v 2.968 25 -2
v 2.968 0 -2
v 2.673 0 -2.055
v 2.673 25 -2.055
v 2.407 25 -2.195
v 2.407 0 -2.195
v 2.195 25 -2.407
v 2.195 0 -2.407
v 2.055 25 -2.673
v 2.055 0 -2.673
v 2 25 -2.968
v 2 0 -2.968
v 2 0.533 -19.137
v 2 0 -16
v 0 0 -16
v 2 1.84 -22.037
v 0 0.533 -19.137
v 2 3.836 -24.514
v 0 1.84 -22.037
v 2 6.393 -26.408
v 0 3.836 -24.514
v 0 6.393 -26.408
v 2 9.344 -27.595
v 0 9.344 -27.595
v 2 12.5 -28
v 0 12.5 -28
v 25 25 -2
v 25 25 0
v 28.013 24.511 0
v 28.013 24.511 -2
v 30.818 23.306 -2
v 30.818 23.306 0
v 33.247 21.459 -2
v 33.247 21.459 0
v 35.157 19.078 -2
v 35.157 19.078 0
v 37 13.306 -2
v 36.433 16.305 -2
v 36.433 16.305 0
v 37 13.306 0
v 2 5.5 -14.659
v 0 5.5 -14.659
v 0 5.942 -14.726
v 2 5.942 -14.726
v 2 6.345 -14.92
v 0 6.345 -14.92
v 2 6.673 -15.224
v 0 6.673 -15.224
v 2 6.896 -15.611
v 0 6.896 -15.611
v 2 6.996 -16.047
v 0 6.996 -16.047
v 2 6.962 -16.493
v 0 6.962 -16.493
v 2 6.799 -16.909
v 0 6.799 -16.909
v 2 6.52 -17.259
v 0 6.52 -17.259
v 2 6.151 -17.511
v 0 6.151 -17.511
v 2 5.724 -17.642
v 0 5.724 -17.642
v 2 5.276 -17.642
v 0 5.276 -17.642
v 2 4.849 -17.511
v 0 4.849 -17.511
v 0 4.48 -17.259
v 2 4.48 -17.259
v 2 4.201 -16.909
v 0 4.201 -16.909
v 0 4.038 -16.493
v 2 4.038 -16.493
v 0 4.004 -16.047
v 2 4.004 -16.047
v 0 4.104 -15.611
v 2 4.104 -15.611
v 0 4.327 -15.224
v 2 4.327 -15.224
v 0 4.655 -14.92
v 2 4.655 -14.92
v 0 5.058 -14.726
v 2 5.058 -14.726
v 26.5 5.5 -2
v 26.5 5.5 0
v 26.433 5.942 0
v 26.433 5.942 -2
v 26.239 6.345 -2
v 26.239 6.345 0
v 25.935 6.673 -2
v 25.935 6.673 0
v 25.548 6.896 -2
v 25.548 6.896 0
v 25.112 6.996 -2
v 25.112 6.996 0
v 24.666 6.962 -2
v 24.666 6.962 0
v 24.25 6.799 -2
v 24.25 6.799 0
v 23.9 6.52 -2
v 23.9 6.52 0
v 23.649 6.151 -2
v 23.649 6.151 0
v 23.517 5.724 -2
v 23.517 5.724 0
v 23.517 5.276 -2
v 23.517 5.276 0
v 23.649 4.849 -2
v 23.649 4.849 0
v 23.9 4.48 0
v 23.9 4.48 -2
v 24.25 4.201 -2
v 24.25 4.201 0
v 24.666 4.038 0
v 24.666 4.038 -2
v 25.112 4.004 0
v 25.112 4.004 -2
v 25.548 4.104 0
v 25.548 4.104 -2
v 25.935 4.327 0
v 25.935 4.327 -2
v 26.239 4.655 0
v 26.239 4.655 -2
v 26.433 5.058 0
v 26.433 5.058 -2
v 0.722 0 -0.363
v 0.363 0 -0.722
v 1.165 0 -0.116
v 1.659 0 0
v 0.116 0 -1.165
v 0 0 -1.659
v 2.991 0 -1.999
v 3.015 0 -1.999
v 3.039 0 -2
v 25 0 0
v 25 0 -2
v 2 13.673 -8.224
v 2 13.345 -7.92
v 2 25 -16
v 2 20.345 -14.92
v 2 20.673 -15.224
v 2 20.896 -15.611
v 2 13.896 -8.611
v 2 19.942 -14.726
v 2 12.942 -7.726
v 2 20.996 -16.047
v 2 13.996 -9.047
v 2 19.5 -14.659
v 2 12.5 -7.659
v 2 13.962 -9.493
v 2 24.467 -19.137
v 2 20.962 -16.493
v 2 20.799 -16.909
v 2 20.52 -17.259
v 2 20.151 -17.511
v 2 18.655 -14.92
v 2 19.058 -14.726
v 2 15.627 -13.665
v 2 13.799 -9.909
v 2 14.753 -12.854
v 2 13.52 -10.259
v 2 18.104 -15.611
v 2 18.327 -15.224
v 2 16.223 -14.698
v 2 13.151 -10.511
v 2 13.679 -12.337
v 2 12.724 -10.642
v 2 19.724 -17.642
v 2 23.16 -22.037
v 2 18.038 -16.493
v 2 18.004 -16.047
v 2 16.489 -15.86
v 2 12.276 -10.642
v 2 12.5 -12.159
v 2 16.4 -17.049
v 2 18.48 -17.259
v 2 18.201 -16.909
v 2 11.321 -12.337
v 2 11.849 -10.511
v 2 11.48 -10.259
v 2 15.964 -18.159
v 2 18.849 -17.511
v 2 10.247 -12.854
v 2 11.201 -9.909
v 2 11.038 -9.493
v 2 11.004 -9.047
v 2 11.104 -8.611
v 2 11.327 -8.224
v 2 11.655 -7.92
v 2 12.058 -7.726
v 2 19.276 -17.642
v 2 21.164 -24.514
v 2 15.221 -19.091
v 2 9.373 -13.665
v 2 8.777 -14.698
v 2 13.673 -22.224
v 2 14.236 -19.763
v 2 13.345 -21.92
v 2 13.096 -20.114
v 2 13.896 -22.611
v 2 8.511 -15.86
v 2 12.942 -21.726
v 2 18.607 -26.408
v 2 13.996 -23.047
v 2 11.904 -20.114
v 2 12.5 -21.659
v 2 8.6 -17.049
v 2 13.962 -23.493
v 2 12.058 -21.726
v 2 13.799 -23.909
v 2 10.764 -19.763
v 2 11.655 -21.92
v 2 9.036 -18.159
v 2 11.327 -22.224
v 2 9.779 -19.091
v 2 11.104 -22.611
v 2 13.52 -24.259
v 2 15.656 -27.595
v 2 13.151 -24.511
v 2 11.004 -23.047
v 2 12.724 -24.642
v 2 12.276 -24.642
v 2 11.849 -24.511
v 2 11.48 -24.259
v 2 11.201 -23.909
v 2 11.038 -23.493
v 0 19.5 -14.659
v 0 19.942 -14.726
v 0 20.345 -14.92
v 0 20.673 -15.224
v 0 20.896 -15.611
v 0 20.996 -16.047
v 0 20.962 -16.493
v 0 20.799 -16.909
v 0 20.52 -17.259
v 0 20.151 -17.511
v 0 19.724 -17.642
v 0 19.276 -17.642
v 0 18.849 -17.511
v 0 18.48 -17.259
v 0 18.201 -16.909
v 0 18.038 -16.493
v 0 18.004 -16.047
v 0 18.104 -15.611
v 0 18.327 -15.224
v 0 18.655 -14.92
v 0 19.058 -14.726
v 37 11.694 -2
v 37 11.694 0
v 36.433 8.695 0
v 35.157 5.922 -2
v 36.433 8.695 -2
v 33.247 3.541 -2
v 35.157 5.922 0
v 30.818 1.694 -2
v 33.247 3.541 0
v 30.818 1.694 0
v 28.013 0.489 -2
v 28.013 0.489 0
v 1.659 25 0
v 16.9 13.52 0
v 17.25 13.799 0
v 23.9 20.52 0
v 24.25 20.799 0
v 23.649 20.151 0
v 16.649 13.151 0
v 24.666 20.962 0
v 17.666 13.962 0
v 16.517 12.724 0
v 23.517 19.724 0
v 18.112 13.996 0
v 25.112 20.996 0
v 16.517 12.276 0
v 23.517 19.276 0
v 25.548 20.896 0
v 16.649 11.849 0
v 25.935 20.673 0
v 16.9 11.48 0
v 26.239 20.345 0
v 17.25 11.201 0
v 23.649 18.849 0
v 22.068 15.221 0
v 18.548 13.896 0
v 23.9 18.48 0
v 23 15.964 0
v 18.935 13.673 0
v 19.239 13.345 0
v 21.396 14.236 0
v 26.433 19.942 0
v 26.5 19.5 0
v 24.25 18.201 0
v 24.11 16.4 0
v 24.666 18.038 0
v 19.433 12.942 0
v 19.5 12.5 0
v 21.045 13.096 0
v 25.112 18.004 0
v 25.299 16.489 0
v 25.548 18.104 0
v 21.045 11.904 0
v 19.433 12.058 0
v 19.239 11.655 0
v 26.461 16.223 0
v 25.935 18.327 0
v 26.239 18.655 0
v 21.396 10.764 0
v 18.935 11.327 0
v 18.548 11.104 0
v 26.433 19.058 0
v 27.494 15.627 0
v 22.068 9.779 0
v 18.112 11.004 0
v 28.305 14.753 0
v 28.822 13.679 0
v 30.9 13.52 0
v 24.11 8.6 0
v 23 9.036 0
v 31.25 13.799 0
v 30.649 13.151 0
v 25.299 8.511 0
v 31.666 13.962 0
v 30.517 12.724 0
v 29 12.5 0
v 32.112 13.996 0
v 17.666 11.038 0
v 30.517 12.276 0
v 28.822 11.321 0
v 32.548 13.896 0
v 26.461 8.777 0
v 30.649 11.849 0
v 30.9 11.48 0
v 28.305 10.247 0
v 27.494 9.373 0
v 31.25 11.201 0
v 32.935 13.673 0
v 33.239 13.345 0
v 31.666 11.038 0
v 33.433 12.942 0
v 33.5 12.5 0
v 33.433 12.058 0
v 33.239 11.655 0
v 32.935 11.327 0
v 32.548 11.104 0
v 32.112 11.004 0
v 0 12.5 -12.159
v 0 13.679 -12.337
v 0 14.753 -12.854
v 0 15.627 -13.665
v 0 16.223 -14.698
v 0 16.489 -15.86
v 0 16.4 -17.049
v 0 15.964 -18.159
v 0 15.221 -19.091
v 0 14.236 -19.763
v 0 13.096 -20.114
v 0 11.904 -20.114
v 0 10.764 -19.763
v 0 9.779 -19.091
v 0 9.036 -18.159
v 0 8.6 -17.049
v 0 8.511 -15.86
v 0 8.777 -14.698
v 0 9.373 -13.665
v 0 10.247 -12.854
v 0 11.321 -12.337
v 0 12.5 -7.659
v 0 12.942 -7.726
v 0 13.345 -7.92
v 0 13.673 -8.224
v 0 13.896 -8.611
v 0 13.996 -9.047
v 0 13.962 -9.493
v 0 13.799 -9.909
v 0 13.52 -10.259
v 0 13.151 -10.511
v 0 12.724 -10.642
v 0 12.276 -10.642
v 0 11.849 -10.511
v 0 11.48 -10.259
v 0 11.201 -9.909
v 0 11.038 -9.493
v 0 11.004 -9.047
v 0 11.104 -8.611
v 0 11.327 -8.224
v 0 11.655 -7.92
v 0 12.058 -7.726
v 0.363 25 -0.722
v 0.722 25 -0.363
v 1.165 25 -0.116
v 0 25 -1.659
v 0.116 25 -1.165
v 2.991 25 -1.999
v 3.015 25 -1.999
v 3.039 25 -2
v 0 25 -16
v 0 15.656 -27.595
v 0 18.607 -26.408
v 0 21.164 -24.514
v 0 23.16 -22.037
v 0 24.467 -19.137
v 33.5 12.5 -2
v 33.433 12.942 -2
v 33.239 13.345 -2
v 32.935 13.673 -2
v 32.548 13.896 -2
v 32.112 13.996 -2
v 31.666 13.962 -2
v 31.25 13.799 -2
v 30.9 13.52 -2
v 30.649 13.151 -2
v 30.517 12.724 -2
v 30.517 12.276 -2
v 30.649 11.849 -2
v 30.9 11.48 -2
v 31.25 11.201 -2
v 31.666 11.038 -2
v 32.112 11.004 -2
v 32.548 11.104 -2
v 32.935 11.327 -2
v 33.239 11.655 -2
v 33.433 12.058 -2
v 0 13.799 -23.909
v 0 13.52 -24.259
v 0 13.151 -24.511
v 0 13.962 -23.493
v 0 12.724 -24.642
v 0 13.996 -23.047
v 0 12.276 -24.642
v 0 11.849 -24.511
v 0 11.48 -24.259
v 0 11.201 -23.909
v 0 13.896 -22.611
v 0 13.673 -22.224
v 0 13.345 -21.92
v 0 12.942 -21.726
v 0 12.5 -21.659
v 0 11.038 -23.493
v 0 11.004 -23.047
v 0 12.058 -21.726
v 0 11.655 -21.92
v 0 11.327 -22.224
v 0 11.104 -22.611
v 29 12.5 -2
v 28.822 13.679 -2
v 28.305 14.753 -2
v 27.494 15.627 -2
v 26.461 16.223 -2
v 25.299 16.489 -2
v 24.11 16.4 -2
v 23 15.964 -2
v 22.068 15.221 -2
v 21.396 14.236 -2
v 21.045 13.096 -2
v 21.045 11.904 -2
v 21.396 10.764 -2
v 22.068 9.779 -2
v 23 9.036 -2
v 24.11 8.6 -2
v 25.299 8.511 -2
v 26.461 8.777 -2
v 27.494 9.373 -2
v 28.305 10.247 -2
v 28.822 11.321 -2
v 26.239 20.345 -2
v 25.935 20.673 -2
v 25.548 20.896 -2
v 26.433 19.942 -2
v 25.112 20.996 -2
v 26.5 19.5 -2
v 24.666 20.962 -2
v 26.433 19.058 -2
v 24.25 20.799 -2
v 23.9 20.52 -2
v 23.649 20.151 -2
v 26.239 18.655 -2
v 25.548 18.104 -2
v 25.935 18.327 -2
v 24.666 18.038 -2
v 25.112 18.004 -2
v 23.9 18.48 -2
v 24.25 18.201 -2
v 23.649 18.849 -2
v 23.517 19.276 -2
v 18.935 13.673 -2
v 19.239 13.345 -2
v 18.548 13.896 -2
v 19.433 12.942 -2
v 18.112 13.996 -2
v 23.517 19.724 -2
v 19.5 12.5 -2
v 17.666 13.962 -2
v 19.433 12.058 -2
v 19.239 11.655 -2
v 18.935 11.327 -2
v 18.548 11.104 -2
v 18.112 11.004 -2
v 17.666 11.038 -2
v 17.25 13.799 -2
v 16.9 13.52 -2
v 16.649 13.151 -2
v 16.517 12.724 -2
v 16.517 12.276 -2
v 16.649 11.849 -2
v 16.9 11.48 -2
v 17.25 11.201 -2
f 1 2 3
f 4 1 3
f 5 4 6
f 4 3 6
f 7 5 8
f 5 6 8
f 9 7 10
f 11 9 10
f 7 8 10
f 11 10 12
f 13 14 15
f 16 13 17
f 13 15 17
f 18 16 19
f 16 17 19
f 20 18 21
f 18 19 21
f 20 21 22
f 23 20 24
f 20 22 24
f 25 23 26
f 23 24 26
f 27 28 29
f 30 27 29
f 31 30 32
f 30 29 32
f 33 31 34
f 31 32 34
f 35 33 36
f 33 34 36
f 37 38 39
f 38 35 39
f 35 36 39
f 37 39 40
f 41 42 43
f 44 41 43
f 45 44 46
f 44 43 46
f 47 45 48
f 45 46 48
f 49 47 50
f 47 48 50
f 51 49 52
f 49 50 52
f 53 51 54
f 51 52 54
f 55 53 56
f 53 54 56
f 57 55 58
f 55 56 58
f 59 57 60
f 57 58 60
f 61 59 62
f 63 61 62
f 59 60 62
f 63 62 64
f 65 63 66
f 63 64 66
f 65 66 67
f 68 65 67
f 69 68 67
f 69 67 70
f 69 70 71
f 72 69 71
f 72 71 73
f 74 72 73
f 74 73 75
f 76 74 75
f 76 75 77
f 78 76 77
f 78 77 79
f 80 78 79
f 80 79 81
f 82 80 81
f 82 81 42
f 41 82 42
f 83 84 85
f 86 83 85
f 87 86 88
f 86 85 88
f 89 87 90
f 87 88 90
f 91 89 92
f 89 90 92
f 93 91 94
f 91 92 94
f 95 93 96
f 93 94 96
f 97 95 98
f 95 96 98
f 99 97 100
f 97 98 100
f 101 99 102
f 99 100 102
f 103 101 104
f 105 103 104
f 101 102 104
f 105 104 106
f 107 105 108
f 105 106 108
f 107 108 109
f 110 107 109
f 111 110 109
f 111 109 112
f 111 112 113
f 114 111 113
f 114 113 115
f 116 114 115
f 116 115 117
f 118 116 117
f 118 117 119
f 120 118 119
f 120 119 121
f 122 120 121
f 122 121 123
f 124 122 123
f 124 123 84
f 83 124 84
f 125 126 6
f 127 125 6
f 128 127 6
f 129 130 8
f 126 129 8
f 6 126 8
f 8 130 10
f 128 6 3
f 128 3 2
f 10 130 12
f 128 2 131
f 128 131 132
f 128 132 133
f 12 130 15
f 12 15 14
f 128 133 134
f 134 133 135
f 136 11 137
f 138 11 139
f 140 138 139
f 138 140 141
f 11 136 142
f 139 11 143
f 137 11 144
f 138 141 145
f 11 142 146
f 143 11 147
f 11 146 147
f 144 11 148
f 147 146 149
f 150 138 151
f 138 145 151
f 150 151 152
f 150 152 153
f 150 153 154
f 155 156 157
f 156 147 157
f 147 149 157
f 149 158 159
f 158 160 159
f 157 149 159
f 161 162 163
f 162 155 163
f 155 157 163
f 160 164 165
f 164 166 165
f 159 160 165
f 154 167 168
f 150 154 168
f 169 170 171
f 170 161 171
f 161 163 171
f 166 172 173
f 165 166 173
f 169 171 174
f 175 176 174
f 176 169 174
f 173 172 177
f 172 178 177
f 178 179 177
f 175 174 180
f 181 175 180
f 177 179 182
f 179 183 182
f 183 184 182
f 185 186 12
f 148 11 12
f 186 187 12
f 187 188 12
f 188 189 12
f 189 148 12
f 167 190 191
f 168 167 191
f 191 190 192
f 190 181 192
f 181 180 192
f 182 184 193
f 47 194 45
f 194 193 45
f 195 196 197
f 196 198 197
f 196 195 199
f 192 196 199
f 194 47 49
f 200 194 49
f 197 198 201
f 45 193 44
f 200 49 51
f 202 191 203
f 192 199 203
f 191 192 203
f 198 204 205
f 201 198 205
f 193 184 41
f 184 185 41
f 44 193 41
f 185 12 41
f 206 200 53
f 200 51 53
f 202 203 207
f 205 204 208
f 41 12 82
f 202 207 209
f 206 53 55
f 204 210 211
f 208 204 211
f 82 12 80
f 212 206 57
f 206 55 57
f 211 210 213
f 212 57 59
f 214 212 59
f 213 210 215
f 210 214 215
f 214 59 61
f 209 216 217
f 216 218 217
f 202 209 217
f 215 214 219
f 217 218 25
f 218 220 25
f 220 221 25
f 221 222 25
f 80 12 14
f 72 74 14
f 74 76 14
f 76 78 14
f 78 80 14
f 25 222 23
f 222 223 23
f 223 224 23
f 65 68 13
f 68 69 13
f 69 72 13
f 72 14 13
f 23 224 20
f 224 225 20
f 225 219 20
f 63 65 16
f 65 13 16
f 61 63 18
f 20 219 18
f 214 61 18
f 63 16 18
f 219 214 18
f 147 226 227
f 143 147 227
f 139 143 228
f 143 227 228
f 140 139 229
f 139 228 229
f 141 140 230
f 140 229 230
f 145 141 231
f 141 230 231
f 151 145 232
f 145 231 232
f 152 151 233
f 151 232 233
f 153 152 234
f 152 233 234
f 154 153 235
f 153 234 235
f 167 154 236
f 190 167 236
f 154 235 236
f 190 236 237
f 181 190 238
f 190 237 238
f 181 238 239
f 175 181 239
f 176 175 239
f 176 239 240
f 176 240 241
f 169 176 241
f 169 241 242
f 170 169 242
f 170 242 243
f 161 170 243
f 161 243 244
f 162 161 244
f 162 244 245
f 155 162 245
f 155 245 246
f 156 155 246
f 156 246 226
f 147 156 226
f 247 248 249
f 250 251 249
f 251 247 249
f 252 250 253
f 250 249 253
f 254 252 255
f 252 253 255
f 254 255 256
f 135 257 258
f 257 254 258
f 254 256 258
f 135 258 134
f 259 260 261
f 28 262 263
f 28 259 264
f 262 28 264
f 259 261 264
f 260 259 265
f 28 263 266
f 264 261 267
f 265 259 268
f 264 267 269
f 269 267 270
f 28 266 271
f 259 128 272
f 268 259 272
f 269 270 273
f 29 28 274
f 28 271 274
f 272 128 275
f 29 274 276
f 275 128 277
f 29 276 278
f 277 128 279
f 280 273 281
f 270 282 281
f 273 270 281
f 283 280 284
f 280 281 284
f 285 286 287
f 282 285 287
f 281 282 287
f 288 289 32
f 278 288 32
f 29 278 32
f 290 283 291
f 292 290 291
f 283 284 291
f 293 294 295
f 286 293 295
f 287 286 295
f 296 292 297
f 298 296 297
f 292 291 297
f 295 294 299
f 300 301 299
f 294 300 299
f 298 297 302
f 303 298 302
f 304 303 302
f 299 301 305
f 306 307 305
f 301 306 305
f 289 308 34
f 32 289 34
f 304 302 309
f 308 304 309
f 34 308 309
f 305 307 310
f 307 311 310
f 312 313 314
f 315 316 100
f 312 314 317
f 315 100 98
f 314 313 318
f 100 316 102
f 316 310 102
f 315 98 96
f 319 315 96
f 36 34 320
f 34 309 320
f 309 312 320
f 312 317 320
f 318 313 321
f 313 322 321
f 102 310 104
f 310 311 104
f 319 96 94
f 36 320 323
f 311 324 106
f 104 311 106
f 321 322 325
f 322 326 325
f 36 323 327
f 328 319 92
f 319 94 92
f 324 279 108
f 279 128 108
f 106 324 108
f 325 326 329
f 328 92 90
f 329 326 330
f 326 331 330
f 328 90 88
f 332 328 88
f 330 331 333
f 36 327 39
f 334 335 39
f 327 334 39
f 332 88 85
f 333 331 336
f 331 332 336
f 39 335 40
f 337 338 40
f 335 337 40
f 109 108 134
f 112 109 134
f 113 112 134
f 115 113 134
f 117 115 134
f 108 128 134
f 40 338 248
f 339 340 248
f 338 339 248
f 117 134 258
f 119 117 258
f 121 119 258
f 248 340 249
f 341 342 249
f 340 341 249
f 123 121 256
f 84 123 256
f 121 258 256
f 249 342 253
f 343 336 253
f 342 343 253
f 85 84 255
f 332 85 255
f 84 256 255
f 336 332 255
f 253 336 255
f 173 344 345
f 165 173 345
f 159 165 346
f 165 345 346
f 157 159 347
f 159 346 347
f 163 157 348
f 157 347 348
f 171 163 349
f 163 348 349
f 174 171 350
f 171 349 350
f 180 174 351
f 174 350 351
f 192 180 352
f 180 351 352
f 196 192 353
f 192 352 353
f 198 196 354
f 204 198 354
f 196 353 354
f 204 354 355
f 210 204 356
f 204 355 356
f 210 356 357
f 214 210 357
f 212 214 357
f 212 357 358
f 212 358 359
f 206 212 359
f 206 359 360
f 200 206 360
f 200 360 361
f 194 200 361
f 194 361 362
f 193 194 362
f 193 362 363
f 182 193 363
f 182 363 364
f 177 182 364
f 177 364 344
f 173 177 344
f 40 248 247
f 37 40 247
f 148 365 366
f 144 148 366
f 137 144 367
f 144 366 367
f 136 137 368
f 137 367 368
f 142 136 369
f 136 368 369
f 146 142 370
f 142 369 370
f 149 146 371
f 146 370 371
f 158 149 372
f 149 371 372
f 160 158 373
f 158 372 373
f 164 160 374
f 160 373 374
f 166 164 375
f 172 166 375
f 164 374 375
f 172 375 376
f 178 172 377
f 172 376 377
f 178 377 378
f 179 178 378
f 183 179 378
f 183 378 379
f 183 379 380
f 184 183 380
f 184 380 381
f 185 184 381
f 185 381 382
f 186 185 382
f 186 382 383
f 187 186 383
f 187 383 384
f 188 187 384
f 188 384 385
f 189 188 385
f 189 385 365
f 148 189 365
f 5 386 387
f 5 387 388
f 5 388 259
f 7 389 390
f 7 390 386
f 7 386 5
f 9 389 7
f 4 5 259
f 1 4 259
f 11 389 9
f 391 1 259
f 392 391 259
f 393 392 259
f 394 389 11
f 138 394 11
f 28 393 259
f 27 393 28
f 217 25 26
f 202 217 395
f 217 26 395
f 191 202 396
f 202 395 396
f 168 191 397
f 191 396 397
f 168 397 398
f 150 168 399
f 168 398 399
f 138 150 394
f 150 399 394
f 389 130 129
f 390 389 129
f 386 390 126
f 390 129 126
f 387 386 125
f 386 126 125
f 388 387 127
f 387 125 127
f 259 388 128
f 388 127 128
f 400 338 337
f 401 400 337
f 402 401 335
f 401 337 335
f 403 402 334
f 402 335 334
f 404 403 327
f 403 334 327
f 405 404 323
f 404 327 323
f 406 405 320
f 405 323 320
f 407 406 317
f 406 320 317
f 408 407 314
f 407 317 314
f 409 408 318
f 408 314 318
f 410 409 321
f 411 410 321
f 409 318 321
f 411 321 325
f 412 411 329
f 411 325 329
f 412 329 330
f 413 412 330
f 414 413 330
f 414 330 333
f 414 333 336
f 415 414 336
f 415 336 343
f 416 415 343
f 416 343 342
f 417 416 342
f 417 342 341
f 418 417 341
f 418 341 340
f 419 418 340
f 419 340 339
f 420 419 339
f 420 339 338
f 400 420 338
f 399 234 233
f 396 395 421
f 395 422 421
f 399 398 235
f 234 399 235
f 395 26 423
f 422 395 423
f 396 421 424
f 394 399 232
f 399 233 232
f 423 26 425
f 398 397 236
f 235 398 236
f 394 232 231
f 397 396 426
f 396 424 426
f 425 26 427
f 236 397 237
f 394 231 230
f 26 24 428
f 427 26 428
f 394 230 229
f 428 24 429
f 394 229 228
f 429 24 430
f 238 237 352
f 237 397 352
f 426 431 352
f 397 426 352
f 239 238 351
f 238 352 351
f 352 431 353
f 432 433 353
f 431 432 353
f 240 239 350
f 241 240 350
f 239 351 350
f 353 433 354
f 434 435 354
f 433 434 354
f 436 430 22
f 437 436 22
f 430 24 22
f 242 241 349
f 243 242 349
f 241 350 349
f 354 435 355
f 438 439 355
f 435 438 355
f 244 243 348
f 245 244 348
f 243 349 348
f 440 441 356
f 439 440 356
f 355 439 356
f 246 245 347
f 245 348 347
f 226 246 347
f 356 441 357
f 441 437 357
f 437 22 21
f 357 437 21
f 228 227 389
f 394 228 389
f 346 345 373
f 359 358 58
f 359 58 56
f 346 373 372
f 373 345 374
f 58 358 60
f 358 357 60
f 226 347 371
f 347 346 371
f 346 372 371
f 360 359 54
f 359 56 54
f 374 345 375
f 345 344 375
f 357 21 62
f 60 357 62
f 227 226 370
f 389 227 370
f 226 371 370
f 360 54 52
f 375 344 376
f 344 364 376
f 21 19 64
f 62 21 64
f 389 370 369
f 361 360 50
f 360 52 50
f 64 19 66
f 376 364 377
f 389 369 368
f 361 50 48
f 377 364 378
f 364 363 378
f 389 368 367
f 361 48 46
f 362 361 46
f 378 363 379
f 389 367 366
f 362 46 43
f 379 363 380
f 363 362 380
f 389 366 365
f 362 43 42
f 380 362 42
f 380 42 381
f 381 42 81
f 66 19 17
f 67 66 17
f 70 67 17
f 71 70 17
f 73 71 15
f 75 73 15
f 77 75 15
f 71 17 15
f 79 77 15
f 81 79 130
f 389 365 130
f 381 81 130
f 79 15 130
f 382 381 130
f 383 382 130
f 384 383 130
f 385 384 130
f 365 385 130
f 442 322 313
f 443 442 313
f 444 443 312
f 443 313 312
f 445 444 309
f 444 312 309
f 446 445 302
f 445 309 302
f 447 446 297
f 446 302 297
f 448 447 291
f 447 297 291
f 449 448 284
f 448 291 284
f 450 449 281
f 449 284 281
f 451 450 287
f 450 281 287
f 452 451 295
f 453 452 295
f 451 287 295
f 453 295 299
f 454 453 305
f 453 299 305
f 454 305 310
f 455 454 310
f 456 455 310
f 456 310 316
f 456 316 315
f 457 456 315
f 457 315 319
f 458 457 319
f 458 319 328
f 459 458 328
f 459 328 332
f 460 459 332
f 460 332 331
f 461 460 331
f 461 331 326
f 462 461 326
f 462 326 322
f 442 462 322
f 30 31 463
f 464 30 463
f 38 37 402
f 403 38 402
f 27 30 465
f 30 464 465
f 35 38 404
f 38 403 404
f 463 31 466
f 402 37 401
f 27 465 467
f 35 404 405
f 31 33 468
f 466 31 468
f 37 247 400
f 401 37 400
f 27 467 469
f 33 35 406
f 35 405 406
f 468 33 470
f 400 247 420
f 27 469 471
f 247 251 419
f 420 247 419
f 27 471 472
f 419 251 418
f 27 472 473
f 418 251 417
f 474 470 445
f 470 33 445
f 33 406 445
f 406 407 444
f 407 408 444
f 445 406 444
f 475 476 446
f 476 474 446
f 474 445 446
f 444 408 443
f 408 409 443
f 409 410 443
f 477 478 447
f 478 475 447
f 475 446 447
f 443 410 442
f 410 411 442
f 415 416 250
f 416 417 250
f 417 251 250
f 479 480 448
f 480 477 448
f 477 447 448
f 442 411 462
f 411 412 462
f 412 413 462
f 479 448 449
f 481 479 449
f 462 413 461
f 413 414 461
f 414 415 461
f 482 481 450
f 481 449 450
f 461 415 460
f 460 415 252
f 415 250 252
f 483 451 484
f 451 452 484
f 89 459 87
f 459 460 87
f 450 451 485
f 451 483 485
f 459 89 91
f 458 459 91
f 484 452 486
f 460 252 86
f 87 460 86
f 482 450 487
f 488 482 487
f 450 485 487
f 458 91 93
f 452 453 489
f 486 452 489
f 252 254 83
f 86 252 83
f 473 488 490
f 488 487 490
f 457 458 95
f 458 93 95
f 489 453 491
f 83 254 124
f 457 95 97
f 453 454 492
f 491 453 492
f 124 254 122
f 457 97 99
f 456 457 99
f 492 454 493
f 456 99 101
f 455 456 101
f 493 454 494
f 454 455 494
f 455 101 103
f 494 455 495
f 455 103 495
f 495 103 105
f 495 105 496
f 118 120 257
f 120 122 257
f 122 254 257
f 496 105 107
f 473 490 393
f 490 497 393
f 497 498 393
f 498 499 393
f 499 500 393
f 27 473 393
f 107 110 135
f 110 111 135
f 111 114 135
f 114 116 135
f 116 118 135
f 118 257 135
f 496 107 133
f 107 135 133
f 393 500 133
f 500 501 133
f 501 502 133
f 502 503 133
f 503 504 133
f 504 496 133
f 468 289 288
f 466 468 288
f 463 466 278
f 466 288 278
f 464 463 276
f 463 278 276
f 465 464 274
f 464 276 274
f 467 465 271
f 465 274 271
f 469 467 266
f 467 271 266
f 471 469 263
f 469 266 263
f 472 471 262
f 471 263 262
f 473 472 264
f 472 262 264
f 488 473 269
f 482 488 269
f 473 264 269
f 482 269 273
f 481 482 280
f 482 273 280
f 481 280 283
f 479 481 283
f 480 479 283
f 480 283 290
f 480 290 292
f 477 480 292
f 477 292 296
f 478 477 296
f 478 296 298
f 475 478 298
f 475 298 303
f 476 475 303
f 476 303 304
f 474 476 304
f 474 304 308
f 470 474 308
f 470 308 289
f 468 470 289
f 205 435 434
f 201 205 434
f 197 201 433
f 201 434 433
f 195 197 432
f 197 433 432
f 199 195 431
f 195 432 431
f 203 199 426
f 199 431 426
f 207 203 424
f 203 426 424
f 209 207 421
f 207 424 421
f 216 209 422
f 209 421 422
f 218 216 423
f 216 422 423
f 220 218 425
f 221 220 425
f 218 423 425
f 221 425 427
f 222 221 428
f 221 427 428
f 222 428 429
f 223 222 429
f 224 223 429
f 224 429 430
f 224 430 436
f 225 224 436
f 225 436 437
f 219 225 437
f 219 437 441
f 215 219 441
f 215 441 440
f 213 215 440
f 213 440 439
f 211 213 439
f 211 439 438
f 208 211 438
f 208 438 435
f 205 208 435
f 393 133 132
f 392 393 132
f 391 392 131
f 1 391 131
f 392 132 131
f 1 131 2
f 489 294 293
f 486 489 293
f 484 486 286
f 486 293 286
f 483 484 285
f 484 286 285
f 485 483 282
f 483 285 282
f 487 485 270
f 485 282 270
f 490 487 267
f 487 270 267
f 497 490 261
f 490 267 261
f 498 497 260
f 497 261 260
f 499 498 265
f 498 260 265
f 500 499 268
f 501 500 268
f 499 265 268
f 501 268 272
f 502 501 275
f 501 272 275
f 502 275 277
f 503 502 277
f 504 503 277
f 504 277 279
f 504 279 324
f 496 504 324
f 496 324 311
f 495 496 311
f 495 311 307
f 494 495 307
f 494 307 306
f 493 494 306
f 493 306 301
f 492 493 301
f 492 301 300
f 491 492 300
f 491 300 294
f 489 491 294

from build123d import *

# Parameters (mm, degrees)
BOSS_EXTRUDE1_DEPTH = 25
CUT_EXTRUDE1_DEPTH  = 25
CUT_EXTRUDE2_DEPTH  = 25
SKETCH5_R           = 4
SKETCH5_R_2         = 1.5
CUT_EXTRUDE3_DEPTH  = 25
SKETCH6_R           = 4
SKETCH6_R_2         = 1.5
CUT_EXTRUDE4_DEPTH  = 25


with BuildPart() as part:
    # Sketch1 → Boss-Extrude1 (new body)
    with BuildSketch(Plane(origin=(0, 0, 0), x_dir=(1, 0, 0), z_dir=(0, 1, 0))):
        with BuildLine():
            ThreePointArc((0, 1.659075407), (0.530256055, 0.530256055), (1.659075407, 0))
            Line((1.659075407, 0), (2, 0))
            Line((2, 0), (37, 0))
            Line((37, 0), (37, 2))
            Line((37, 2), (3.038729714, 2))
            ThreePointArc((3.038729714, 2), (3.003147911, 1.999369152), (2.967566108, 2))
            ThreePointArc((2.967566108, 2), (2.293369144, 2.293369144), (2, 2.967566108))
            Line((2, 2.967566108), (2, 28))
            Line((2, 28), (0, 28))
            Line((0, 28), (0, 2))
            Line((0, 2), (0, 1.659075407))
        make_face()
    extrude(amount=BOSS_EXTRUDE1_DEPTH)

    # Sketch2 → Cut-Extrude1 (cut)
    with BuildSketch(Plane.ZY):
        with BuildLine():
            ThreePointArc((-28, 12.5), (-24.514439297, 21.163861726), (-16, 25))
            Line((-16, 25), (-28, 25))
            Line((-28, 25), (-28, 12.5))
        make_face()
        with BuildLine():
            ThreePointArc((-16, 0), (-24.514439297, 3.836138274), (-28, 12.5))
            Line((-28, 12.5), (-28, 0))
            Line((-28, 0), (-16, 0))
        make_face()
    extrude(amount=-CUT_EXTRUDE1_DEPTH, mode=Mode.SUBTRACT)

    # Sketch4 → Cut-Extrude2 (cut)
    with BuildSketch(Plane.XY):
        with BuildLine():
            Line((37, 25), (25, 25))
            ThreePointArc((25, 25), (33.247279652, 21.458751494), (37, 13.305521912))
            Line((37, 13.305521912), (37, 25))
        make_face()
        with BuildLine():
            Line((37, 0), (37, 11.694478088))
            ThreePointArc((37, 11.694478088), (33.247279652, 3.541248506), (25, 0))
            Line((25, 0), (37, 0))
        make_face()
    extrude(amount=-CUT_EXTRUDE2_DEPTH, mode=Mode.SUBTRACT)

    # Sketch5 → Cut-Extrude3 (cut)
    with BuildSketch(Plane.XY):
        with Locations((25, 12.5)):
            Circle(SKETCH5_R)
        with Locations((25, 19.5)):
            Circle(SKETCH5_R_2)
        with Locations((32, 12.5)):
            Circle(SKETCH5_R_2)
        with Locations((25, 5.5)):
            Circle(SKETCH5_R_2)
        with Locations((18, 12.5)):
            Circle(SKETCH5_R_2)
    extrude(amount=-CUT_EXTRUDE3_DEPTH, mode=Mode.SUBTRACT)

    # Sketch6 → Cut-Extrude4 (cut)
    with BuildSketch(Plane.ZY):
        with Locations((-16.159075407, 12.5)):
            Circle(SKETCH6_R)
        with Locations((-16.159075407, 19.5)):
            Circle(SKETCH6_R_2)
        with Locations((-9.159075407, 12.5)):
            Circle(SKETCH6_R_2)
        with Locations((-16.159075407, 5.5)):
            Circle(SKETCH6_R_2)
        with Locations((-23.159075407, 12.5)):
            Circle(SKETCH6_R_2)
    extrude(amount=-CUT_EXTRUDE4_DEPTH, mode=Mode.SUBTRACT)


solid = part.part
